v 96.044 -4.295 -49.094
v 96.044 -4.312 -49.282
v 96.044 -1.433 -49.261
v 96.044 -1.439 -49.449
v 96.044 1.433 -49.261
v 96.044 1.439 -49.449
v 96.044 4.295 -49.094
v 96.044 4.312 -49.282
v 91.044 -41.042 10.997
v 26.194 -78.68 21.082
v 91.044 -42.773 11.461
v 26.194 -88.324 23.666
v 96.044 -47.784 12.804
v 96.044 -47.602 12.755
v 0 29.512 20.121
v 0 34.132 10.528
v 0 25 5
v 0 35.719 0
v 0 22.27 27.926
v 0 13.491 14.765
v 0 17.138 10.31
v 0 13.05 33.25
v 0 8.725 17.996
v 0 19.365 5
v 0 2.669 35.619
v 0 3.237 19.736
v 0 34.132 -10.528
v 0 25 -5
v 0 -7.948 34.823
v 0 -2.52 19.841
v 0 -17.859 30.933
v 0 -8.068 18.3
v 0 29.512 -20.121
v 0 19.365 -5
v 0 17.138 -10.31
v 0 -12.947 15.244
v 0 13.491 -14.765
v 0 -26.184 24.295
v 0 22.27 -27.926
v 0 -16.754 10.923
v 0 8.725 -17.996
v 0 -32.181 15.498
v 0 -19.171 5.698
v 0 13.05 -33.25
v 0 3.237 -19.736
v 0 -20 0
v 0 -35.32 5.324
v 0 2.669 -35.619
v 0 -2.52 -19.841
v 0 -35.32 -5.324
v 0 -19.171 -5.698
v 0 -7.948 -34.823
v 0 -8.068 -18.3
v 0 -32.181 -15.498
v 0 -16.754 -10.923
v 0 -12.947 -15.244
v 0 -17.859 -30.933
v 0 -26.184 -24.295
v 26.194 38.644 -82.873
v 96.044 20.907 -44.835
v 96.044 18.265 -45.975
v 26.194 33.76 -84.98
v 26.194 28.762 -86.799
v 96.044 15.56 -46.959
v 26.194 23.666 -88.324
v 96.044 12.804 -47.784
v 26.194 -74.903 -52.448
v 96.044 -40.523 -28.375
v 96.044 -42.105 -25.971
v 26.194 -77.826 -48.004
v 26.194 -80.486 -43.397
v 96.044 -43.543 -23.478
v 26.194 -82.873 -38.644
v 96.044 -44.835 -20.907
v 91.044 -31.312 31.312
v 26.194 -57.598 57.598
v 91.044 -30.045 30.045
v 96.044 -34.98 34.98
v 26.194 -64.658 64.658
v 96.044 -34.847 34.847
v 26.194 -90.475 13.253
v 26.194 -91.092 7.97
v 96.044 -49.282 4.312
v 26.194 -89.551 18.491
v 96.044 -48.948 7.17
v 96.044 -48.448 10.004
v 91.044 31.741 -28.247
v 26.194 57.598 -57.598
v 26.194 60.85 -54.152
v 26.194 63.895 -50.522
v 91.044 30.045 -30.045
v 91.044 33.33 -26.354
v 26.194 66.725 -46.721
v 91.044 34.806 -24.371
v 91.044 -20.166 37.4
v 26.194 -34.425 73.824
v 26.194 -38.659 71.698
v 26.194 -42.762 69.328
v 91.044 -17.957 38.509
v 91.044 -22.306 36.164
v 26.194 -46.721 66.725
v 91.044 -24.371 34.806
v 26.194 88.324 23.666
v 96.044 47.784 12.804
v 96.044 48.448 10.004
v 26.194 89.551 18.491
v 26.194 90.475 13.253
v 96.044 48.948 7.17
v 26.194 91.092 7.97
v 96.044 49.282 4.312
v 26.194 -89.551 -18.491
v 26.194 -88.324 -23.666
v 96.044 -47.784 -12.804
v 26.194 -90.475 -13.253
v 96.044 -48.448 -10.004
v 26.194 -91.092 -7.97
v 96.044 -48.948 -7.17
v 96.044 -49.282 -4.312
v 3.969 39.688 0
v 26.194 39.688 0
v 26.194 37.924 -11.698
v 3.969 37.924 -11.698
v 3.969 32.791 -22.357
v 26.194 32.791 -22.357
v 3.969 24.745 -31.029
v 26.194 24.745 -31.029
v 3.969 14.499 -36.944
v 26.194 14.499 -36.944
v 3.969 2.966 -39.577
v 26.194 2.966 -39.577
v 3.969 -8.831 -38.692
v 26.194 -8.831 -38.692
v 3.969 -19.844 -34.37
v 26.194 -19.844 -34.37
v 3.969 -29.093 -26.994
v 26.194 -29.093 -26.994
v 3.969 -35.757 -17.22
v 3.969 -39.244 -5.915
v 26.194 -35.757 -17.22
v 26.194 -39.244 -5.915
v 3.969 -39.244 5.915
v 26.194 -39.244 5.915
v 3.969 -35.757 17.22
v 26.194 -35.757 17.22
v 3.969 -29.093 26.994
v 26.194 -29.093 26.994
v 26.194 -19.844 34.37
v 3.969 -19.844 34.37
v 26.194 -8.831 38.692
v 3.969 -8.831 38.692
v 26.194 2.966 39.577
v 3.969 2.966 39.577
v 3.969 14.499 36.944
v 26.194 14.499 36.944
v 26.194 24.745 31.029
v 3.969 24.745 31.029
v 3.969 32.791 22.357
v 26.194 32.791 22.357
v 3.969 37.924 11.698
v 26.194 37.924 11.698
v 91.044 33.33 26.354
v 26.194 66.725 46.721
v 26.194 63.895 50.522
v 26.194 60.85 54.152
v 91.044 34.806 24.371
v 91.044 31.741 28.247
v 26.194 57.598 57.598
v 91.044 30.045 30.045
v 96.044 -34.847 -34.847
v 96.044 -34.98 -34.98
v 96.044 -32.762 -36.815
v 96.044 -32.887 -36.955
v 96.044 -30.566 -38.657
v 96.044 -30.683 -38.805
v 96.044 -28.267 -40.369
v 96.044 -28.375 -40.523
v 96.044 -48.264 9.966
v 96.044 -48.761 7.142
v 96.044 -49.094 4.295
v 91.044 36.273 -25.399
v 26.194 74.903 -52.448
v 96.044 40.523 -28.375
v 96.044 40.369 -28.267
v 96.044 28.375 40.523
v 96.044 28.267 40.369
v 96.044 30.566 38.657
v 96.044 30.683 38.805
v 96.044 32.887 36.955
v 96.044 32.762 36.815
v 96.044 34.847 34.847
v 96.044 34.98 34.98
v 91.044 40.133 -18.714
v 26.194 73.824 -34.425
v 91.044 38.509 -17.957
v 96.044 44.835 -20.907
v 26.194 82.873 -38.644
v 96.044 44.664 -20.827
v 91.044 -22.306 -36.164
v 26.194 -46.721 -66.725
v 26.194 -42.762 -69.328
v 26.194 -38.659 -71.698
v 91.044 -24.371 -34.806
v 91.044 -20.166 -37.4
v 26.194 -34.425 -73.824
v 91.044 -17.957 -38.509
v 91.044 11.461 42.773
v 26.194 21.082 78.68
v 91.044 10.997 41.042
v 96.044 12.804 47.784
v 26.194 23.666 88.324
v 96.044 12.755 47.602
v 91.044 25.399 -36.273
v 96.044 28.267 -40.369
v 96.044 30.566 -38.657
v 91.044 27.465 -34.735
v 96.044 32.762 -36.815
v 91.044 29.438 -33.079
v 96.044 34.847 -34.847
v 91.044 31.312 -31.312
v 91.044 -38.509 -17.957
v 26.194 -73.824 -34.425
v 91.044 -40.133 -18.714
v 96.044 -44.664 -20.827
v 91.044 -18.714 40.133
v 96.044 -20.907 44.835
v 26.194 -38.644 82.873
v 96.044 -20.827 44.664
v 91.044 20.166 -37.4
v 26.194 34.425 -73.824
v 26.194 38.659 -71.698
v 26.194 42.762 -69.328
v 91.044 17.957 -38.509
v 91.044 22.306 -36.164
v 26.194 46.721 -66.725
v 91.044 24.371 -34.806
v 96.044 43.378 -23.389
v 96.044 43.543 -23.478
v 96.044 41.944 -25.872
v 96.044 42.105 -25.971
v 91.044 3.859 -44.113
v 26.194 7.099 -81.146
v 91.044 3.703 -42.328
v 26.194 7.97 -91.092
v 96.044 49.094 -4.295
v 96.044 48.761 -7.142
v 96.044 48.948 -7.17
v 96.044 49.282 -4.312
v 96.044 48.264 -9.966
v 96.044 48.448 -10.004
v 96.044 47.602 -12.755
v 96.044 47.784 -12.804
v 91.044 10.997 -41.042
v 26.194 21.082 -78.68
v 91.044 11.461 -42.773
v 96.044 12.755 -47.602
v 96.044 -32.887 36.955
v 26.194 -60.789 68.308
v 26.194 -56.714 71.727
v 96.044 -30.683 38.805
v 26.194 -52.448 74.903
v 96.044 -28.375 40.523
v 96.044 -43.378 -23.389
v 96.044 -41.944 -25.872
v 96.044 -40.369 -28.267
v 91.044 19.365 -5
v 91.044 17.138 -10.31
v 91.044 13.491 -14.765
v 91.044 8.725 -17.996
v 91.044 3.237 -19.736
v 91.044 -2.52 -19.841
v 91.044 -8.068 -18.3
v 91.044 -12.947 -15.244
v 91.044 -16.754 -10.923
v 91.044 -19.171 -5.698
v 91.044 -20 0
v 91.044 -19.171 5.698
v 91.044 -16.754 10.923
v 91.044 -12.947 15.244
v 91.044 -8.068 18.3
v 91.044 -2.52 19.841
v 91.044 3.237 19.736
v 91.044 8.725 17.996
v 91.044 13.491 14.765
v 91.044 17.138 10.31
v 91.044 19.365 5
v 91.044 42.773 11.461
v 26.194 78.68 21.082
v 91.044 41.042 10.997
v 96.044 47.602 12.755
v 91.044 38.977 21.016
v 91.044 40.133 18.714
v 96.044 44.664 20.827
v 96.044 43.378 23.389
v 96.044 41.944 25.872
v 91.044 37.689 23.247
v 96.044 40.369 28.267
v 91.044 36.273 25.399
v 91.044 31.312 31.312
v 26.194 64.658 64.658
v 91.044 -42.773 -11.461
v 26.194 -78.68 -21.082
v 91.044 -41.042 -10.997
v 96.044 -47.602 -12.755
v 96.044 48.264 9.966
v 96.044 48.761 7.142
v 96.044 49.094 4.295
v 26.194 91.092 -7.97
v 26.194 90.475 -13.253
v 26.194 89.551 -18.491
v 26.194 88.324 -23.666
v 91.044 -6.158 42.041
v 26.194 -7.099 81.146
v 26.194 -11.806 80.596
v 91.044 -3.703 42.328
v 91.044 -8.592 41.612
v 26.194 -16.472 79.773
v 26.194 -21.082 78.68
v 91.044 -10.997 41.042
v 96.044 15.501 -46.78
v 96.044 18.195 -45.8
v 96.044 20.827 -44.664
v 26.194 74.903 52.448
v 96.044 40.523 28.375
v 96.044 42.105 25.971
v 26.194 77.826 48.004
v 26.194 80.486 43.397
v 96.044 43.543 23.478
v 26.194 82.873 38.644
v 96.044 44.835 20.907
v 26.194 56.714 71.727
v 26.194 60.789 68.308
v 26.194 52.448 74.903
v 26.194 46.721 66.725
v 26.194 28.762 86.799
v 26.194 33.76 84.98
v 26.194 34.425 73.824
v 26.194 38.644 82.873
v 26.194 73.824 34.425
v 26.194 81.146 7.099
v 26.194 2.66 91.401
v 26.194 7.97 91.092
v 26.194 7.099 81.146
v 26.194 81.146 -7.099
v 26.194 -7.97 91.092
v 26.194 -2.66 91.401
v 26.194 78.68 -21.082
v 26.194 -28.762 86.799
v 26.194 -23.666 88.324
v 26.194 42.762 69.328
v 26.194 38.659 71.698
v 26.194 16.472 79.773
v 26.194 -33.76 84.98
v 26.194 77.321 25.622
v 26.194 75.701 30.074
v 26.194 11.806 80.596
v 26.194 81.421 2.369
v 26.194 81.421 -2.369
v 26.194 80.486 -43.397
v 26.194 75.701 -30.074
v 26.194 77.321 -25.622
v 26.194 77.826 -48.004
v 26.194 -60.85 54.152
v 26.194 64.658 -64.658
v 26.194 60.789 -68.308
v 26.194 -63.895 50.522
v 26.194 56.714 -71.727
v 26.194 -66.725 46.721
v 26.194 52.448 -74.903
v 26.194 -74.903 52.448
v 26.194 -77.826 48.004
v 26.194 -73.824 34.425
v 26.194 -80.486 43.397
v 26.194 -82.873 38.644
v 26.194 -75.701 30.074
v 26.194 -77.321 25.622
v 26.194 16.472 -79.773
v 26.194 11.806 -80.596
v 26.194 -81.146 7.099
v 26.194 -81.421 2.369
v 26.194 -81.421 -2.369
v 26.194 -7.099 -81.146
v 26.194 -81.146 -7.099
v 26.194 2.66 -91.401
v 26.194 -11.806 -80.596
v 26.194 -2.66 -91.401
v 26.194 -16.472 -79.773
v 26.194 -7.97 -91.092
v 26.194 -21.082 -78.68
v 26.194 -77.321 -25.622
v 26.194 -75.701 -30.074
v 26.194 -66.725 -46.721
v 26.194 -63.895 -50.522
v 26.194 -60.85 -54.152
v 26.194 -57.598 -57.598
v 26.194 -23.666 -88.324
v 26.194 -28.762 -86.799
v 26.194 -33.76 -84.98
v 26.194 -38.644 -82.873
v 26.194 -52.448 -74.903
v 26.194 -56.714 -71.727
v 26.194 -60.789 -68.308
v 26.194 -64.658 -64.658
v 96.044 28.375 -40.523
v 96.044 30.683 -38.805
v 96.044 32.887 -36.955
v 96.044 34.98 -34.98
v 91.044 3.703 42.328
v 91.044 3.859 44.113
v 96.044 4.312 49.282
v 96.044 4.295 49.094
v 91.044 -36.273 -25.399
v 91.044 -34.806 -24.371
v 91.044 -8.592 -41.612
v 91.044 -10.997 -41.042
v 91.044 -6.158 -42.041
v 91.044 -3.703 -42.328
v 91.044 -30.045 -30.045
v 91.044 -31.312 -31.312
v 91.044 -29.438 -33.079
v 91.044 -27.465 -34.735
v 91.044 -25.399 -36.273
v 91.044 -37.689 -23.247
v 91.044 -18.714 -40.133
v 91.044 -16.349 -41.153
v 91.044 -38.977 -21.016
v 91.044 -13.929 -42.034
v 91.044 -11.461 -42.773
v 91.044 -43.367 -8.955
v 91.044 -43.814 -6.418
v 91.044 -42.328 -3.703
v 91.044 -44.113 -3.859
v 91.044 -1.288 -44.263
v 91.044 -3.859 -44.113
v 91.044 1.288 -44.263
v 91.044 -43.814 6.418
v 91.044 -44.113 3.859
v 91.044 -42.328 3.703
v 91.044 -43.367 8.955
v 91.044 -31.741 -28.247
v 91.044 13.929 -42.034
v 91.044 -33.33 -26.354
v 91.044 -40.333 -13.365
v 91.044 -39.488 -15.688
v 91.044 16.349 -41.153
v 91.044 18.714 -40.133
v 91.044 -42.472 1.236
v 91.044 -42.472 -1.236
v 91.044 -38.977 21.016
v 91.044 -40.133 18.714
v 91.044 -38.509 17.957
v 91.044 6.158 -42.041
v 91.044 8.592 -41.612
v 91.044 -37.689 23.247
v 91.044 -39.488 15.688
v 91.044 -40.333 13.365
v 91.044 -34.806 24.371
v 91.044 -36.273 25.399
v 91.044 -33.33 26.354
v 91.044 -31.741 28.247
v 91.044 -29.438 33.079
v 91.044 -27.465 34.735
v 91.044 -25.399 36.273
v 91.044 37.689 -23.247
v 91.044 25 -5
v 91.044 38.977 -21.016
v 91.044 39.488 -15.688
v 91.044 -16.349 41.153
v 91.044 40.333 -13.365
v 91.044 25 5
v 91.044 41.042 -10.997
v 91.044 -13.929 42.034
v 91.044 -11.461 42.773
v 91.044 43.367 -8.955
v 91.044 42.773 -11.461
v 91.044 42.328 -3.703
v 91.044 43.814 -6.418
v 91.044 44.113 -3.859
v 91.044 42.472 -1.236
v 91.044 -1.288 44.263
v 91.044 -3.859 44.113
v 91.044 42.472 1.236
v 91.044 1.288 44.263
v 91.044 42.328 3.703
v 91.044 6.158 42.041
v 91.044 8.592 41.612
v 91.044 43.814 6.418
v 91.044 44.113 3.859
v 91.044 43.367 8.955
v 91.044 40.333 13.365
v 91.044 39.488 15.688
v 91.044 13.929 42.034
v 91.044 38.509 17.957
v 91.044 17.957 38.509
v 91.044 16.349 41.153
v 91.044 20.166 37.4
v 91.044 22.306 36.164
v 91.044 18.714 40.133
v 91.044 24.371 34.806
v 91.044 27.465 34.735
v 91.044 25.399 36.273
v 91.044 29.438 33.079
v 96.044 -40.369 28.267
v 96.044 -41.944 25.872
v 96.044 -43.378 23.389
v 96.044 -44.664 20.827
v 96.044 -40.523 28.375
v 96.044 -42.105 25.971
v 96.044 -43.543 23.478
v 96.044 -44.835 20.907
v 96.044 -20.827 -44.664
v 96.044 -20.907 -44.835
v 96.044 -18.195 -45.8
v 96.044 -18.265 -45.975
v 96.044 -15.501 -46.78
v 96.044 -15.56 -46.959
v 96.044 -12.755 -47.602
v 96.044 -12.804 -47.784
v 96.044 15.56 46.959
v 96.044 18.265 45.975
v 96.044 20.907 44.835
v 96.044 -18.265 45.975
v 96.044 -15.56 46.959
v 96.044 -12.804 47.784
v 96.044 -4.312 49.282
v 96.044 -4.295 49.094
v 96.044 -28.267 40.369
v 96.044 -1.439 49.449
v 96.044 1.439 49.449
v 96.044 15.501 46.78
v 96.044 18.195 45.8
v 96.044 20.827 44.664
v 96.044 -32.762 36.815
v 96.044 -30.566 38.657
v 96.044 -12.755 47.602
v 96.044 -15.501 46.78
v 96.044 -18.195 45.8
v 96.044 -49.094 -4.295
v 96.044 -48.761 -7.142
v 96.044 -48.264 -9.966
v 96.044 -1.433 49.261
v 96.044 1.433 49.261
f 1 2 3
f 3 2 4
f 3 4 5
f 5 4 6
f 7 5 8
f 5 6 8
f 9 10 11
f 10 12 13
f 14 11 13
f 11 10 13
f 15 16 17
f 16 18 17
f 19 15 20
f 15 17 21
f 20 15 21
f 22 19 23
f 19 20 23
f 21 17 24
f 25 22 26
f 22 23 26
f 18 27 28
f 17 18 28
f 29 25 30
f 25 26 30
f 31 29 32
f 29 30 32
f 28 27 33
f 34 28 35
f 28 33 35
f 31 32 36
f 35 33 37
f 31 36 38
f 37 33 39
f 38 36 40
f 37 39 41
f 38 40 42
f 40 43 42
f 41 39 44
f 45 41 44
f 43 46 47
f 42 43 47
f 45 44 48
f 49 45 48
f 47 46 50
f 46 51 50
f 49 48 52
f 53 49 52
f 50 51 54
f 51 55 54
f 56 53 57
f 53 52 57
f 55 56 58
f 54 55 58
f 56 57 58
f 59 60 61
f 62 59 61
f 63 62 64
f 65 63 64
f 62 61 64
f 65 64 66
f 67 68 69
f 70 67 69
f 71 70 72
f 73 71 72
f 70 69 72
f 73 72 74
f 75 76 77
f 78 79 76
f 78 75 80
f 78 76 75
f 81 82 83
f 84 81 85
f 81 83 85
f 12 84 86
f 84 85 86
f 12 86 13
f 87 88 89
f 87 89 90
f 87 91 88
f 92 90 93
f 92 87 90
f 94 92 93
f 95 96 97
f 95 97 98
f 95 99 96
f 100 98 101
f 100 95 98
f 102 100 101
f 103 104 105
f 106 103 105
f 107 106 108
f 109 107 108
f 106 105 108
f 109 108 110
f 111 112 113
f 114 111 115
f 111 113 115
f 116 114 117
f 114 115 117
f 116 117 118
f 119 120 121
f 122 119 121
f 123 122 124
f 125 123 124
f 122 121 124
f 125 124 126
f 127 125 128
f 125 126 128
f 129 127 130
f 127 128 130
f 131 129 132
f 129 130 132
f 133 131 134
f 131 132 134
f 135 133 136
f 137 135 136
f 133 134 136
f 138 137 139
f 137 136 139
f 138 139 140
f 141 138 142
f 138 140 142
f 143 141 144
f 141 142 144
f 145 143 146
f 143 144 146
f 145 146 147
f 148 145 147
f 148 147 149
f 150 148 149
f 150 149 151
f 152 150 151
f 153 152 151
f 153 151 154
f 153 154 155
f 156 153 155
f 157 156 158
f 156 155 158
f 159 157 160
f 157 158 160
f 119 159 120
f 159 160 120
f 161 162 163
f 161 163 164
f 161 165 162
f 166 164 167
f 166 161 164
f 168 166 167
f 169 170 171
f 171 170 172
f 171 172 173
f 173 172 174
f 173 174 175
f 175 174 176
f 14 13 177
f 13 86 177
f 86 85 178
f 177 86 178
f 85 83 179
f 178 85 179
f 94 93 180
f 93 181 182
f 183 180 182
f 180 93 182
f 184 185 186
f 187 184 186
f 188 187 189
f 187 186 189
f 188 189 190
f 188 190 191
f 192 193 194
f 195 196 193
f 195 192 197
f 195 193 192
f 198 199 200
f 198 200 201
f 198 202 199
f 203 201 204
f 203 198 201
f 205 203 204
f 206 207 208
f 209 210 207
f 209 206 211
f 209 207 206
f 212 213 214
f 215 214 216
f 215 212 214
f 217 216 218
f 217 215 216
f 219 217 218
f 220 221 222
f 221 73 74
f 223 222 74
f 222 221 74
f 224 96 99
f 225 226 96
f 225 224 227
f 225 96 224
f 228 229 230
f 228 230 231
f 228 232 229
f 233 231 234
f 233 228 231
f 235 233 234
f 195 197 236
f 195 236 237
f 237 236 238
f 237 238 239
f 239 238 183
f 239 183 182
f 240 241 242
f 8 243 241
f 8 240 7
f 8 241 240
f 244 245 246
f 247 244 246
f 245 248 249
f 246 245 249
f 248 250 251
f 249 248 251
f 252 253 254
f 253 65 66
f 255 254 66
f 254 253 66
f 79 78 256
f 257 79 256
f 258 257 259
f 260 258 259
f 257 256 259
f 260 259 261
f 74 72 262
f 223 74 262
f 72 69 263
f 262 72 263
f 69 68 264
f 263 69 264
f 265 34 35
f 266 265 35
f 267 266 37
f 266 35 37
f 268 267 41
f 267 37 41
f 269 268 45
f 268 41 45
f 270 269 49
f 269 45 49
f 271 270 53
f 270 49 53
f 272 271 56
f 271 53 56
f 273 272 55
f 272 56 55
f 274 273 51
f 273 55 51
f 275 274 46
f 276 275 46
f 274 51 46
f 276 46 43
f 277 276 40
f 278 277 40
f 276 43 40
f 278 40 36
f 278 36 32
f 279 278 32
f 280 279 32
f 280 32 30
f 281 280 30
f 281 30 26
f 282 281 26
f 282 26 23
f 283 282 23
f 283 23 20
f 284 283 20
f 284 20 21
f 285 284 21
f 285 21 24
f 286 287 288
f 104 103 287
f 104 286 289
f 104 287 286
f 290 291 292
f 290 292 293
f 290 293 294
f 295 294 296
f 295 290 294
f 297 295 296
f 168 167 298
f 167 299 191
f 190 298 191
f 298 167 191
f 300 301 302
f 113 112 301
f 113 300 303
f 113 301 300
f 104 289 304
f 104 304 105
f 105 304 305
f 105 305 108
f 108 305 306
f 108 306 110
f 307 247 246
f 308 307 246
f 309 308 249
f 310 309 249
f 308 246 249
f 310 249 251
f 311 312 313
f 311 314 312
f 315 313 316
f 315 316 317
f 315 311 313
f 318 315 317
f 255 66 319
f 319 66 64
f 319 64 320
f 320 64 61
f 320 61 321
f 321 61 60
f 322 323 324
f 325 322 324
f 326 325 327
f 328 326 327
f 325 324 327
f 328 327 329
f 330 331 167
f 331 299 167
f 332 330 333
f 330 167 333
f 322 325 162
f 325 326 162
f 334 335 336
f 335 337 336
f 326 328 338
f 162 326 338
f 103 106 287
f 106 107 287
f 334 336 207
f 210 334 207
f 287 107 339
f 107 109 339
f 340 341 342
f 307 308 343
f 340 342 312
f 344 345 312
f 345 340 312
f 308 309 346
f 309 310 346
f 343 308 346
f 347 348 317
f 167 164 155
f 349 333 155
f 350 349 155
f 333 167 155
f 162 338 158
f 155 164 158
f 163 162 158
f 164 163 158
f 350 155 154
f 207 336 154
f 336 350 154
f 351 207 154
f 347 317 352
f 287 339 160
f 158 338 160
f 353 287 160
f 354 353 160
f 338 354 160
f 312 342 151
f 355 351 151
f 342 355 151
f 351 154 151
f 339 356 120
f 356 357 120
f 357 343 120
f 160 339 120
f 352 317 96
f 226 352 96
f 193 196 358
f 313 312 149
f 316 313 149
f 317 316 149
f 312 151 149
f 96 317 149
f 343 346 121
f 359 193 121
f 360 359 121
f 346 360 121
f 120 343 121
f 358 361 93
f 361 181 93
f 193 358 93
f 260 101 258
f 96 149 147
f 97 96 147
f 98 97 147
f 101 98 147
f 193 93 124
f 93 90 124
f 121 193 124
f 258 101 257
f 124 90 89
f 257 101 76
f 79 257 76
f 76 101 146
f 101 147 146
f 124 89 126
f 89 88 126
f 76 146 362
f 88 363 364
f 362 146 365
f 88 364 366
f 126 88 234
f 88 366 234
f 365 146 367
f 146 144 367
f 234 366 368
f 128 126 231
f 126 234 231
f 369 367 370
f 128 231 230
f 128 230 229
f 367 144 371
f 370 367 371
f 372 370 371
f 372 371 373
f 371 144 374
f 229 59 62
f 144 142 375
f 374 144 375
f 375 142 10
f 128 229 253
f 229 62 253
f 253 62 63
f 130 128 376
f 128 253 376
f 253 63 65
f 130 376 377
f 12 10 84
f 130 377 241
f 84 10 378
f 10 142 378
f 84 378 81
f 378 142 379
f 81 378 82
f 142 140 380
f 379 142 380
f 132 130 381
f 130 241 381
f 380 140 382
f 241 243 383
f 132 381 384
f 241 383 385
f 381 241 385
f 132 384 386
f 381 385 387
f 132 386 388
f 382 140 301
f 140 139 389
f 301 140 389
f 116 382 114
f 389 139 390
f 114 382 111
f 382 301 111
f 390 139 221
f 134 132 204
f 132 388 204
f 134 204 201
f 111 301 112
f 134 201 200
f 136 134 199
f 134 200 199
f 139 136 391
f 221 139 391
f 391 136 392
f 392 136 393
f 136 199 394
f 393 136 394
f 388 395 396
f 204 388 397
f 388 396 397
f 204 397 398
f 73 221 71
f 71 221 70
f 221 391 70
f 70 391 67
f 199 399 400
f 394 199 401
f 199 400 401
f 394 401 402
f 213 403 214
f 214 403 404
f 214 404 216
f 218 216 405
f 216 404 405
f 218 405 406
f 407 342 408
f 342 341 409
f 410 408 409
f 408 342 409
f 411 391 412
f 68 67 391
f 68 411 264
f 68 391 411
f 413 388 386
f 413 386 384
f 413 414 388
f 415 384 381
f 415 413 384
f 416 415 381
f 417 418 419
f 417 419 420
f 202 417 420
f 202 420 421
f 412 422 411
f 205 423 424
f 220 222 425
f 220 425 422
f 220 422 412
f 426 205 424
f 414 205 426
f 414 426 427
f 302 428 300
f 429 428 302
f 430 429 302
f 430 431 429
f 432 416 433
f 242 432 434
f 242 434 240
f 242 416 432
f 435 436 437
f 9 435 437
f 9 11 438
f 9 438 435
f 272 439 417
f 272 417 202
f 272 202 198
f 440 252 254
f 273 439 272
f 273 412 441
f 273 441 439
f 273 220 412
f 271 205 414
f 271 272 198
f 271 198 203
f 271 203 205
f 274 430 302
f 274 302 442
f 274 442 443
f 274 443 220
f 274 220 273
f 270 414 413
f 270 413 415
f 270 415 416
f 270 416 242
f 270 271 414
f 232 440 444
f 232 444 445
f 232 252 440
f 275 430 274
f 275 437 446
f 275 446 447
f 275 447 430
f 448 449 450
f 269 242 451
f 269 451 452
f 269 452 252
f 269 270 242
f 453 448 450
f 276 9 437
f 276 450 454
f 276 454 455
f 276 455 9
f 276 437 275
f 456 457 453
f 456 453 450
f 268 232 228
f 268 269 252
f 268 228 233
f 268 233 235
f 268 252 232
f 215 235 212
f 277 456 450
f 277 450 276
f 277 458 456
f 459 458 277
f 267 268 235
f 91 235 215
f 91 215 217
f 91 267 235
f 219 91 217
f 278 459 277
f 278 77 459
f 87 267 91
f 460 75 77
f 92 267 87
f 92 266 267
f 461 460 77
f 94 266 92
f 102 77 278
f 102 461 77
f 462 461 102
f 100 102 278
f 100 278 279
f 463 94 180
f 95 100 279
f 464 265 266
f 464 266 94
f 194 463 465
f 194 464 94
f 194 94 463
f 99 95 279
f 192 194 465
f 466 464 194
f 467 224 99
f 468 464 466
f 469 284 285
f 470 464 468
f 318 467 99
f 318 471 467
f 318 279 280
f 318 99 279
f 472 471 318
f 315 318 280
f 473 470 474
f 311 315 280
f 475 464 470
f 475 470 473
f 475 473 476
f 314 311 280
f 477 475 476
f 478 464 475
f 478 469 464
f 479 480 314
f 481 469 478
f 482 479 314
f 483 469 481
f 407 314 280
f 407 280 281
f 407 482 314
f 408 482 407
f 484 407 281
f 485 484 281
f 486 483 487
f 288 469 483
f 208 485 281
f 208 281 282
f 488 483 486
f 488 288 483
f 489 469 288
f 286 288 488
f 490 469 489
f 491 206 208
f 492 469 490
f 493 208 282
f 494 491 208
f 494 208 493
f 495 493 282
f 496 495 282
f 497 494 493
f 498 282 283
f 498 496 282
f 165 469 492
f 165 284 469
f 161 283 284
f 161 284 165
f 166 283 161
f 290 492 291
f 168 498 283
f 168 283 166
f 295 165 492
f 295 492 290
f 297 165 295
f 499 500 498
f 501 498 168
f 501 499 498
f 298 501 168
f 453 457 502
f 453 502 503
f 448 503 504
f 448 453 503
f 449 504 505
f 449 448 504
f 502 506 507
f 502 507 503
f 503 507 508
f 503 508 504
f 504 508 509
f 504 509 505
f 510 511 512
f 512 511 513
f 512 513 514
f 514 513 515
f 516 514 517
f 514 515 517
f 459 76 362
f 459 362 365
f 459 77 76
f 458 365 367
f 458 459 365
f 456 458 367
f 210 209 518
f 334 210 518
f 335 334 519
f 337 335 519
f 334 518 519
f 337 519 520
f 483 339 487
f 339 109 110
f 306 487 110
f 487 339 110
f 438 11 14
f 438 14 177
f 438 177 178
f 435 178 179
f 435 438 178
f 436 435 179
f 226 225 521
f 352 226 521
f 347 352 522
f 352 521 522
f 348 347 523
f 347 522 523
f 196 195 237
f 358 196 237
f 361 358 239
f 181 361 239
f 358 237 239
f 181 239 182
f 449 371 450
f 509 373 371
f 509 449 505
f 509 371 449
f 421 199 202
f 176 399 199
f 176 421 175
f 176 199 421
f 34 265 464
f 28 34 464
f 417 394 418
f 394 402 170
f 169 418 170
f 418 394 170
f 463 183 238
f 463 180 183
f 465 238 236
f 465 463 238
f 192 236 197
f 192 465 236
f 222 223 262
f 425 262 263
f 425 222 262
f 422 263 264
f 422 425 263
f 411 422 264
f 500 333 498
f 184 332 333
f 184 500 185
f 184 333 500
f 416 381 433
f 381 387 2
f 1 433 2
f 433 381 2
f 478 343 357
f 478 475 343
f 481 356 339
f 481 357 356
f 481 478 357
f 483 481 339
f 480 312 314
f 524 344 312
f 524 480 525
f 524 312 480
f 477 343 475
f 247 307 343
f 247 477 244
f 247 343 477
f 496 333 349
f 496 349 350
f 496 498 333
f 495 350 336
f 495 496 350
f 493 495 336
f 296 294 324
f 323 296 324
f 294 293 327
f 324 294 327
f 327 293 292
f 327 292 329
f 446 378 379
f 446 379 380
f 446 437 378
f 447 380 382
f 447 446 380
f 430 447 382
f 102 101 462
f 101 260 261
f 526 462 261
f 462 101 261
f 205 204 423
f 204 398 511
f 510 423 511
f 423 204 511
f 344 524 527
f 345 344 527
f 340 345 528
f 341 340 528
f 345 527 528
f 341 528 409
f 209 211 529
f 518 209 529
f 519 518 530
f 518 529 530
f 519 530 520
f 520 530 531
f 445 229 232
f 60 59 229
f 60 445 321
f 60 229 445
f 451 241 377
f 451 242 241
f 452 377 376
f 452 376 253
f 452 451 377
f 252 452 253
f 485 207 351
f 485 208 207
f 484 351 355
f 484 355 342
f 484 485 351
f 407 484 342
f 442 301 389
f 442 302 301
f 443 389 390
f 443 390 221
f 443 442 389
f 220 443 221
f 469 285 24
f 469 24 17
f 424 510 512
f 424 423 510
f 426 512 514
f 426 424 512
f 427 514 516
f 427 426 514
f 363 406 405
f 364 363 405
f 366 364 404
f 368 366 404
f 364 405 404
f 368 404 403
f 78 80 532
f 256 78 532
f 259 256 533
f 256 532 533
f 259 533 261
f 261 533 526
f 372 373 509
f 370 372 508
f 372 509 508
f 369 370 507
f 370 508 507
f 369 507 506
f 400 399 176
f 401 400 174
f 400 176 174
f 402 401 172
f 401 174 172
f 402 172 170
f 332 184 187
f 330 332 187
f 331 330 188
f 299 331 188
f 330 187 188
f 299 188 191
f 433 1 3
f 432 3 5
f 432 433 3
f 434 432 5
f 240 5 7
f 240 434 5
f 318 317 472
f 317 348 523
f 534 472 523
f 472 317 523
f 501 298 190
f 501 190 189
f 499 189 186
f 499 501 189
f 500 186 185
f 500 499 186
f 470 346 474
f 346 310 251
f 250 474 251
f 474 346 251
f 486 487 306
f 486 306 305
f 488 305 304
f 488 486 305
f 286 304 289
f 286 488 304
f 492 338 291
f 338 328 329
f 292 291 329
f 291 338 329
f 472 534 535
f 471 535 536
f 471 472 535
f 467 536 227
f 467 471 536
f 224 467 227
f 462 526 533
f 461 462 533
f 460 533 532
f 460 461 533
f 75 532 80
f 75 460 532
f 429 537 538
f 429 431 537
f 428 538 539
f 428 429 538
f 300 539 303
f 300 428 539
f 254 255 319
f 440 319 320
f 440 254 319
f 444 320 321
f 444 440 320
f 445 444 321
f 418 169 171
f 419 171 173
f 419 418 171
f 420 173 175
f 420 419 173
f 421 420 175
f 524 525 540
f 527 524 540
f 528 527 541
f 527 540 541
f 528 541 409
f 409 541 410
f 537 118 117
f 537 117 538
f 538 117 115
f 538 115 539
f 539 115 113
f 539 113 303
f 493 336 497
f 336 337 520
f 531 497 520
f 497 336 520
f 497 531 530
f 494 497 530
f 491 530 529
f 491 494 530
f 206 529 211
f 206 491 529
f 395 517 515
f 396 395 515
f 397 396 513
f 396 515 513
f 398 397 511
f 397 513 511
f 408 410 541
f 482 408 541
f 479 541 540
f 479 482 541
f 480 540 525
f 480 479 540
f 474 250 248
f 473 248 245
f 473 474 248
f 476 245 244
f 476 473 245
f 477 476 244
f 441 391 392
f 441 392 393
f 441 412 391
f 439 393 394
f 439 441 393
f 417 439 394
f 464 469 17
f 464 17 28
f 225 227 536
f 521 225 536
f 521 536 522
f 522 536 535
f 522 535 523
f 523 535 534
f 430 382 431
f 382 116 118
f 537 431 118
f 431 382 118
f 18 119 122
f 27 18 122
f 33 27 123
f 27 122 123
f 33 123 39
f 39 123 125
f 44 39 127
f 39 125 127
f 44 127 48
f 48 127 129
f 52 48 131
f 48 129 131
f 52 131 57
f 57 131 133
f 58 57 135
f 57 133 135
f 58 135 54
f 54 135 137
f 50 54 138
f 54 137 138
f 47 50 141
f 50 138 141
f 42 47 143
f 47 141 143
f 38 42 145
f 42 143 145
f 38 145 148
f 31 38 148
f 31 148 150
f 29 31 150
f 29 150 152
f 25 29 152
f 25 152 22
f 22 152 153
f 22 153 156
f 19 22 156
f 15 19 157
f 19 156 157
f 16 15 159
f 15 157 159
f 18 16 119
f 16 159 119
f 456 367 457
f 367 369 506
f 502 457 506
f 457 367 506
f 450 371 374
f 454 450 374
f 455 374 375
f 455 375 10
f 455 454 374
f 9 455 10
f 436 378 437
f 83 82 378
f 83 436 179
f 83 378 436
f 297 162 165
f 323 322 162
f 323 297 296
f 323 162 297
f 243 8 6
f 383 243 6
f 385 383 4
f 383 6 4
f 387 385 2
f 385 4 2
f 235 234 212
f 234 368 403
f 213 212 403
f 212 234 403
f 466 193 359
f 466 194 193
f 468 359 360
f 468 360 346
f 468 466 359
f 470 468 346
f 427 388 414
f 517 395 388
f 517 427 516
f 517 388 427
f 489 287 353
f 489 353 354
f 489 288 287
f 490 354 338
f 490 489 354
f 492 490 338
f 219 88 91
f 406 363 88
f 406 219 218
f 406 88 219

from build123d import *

# Parameters (mm, degrees)
CHANFRO1_SIZE         = 3.96875
CORTE_REVOLU_O1_ANGLE = 10
PADR_OCIRCULAR1_COUNT = 18
ESBO_O8_W             = 10
ESBO_O8_H             = 10
CORTE_EXTRUS_O1_DEPTH = 92.04375


with BuildPart() as part:
    # Esboço1 → Revolução1 (revolve)
    with BuildSketch(Plane.XY):
        Polygon((0, 20), (0, 39.6875), (26.19375, 39.6875), (26.19375, 91.44), (96.04375, 49.469885761), (96.04375, 20), align=None)
    revolve(axis=Axis((206.361590972, 0, 0), (-1, 0, 0)))

    # Chanfro1
    chanfro1_edges = [part.edges().sort_by_distance(p)[0] for p in [
        (0, -39.6875, 0),
    ]]
    chamfer(chanfro1_edges, length=CHANFRO1_SIZE)

    # Esboço3 → Corte-Revolução1 (revolve, symmetric, cut)
    with BuildSketch(Plane.XY) as corte_revolu_o1_sk:
        Polygon((96.04375, 49.469885761), (26.19375, 91.44), (26.19375, 81.455895118), (96.04375, 39.485780879), align=None)
    corte_revolu_o1 = revolve(axis=Axis((96.04375, 0, 0), (1, 0, 0)), revolution_arc=CORTE_REVOLU_O1_ANGLE / 2, mode=Mode.SUBTRACT)
    corte_revolu_o1 = corte_revolu_o1 + revolve(corte_revolu_o1_sk.sketch, axis=Axis((96.04375, 0, 0), (-1, 0, 0)), revolution_arc=CORTE_REVOLU_O1_ANGLE / 2, mode=Mode.SUBTRACT)

    # PadrãoCircular1: Corte-Revolução1 ×18 about axis
    padr_ocircular1_axis = Axis((0, 0, 0), (1, 0, 0))
    for i in range(1, PADR_OCIRCULAR1_COUNT):
        add(corte_revolu_o1.rotate(padr_ocircular1_axis, i * 360 / PADR_OCIRCULAR1_COUNT), mode=Mode.SUBTRACT)

    # Esboço7 → Corte-Revolução2 (revolve, cut)
    with BuildSketch(Plane(origin=(0, 0, 0), x_dir=(1, 0, 0), z_dir=(0, 1, 0)), mode=Mode.PRIVATE) as corte_revolu_o2_sk:
        Polygon((96.04375, 0), (96.04375, 49.28163791), (91.04375, 44.28163791), (91.04375, 0), align=None)
    revolve(corte_revolu_o2_sk.sketch.rotate(Axis((91.04375, 0, 0), (1, 0, 0)), 90), axis=Axis((91.04375, 0, 0), (1, 0, 0)), mode=Mode.SUBTRACT)  # turned: the seam where the file's is

    # Esboço8 → Corte-extrusão1 (cut, through all)
    with BuildSketch(Plane(origin=(91.04375, 0, 0), x_dir=(0, 0, -1), z_dir=(1, 0, 0))):
        with Locations((0, 20)):
            Rectangle(ESBO_O8_W, ESBO_O8_H)
    extrude(amount=-CORTE_EXTRUS_O1_DEPTH, mode=Mode.SUBTRACT)


solid = part.part
